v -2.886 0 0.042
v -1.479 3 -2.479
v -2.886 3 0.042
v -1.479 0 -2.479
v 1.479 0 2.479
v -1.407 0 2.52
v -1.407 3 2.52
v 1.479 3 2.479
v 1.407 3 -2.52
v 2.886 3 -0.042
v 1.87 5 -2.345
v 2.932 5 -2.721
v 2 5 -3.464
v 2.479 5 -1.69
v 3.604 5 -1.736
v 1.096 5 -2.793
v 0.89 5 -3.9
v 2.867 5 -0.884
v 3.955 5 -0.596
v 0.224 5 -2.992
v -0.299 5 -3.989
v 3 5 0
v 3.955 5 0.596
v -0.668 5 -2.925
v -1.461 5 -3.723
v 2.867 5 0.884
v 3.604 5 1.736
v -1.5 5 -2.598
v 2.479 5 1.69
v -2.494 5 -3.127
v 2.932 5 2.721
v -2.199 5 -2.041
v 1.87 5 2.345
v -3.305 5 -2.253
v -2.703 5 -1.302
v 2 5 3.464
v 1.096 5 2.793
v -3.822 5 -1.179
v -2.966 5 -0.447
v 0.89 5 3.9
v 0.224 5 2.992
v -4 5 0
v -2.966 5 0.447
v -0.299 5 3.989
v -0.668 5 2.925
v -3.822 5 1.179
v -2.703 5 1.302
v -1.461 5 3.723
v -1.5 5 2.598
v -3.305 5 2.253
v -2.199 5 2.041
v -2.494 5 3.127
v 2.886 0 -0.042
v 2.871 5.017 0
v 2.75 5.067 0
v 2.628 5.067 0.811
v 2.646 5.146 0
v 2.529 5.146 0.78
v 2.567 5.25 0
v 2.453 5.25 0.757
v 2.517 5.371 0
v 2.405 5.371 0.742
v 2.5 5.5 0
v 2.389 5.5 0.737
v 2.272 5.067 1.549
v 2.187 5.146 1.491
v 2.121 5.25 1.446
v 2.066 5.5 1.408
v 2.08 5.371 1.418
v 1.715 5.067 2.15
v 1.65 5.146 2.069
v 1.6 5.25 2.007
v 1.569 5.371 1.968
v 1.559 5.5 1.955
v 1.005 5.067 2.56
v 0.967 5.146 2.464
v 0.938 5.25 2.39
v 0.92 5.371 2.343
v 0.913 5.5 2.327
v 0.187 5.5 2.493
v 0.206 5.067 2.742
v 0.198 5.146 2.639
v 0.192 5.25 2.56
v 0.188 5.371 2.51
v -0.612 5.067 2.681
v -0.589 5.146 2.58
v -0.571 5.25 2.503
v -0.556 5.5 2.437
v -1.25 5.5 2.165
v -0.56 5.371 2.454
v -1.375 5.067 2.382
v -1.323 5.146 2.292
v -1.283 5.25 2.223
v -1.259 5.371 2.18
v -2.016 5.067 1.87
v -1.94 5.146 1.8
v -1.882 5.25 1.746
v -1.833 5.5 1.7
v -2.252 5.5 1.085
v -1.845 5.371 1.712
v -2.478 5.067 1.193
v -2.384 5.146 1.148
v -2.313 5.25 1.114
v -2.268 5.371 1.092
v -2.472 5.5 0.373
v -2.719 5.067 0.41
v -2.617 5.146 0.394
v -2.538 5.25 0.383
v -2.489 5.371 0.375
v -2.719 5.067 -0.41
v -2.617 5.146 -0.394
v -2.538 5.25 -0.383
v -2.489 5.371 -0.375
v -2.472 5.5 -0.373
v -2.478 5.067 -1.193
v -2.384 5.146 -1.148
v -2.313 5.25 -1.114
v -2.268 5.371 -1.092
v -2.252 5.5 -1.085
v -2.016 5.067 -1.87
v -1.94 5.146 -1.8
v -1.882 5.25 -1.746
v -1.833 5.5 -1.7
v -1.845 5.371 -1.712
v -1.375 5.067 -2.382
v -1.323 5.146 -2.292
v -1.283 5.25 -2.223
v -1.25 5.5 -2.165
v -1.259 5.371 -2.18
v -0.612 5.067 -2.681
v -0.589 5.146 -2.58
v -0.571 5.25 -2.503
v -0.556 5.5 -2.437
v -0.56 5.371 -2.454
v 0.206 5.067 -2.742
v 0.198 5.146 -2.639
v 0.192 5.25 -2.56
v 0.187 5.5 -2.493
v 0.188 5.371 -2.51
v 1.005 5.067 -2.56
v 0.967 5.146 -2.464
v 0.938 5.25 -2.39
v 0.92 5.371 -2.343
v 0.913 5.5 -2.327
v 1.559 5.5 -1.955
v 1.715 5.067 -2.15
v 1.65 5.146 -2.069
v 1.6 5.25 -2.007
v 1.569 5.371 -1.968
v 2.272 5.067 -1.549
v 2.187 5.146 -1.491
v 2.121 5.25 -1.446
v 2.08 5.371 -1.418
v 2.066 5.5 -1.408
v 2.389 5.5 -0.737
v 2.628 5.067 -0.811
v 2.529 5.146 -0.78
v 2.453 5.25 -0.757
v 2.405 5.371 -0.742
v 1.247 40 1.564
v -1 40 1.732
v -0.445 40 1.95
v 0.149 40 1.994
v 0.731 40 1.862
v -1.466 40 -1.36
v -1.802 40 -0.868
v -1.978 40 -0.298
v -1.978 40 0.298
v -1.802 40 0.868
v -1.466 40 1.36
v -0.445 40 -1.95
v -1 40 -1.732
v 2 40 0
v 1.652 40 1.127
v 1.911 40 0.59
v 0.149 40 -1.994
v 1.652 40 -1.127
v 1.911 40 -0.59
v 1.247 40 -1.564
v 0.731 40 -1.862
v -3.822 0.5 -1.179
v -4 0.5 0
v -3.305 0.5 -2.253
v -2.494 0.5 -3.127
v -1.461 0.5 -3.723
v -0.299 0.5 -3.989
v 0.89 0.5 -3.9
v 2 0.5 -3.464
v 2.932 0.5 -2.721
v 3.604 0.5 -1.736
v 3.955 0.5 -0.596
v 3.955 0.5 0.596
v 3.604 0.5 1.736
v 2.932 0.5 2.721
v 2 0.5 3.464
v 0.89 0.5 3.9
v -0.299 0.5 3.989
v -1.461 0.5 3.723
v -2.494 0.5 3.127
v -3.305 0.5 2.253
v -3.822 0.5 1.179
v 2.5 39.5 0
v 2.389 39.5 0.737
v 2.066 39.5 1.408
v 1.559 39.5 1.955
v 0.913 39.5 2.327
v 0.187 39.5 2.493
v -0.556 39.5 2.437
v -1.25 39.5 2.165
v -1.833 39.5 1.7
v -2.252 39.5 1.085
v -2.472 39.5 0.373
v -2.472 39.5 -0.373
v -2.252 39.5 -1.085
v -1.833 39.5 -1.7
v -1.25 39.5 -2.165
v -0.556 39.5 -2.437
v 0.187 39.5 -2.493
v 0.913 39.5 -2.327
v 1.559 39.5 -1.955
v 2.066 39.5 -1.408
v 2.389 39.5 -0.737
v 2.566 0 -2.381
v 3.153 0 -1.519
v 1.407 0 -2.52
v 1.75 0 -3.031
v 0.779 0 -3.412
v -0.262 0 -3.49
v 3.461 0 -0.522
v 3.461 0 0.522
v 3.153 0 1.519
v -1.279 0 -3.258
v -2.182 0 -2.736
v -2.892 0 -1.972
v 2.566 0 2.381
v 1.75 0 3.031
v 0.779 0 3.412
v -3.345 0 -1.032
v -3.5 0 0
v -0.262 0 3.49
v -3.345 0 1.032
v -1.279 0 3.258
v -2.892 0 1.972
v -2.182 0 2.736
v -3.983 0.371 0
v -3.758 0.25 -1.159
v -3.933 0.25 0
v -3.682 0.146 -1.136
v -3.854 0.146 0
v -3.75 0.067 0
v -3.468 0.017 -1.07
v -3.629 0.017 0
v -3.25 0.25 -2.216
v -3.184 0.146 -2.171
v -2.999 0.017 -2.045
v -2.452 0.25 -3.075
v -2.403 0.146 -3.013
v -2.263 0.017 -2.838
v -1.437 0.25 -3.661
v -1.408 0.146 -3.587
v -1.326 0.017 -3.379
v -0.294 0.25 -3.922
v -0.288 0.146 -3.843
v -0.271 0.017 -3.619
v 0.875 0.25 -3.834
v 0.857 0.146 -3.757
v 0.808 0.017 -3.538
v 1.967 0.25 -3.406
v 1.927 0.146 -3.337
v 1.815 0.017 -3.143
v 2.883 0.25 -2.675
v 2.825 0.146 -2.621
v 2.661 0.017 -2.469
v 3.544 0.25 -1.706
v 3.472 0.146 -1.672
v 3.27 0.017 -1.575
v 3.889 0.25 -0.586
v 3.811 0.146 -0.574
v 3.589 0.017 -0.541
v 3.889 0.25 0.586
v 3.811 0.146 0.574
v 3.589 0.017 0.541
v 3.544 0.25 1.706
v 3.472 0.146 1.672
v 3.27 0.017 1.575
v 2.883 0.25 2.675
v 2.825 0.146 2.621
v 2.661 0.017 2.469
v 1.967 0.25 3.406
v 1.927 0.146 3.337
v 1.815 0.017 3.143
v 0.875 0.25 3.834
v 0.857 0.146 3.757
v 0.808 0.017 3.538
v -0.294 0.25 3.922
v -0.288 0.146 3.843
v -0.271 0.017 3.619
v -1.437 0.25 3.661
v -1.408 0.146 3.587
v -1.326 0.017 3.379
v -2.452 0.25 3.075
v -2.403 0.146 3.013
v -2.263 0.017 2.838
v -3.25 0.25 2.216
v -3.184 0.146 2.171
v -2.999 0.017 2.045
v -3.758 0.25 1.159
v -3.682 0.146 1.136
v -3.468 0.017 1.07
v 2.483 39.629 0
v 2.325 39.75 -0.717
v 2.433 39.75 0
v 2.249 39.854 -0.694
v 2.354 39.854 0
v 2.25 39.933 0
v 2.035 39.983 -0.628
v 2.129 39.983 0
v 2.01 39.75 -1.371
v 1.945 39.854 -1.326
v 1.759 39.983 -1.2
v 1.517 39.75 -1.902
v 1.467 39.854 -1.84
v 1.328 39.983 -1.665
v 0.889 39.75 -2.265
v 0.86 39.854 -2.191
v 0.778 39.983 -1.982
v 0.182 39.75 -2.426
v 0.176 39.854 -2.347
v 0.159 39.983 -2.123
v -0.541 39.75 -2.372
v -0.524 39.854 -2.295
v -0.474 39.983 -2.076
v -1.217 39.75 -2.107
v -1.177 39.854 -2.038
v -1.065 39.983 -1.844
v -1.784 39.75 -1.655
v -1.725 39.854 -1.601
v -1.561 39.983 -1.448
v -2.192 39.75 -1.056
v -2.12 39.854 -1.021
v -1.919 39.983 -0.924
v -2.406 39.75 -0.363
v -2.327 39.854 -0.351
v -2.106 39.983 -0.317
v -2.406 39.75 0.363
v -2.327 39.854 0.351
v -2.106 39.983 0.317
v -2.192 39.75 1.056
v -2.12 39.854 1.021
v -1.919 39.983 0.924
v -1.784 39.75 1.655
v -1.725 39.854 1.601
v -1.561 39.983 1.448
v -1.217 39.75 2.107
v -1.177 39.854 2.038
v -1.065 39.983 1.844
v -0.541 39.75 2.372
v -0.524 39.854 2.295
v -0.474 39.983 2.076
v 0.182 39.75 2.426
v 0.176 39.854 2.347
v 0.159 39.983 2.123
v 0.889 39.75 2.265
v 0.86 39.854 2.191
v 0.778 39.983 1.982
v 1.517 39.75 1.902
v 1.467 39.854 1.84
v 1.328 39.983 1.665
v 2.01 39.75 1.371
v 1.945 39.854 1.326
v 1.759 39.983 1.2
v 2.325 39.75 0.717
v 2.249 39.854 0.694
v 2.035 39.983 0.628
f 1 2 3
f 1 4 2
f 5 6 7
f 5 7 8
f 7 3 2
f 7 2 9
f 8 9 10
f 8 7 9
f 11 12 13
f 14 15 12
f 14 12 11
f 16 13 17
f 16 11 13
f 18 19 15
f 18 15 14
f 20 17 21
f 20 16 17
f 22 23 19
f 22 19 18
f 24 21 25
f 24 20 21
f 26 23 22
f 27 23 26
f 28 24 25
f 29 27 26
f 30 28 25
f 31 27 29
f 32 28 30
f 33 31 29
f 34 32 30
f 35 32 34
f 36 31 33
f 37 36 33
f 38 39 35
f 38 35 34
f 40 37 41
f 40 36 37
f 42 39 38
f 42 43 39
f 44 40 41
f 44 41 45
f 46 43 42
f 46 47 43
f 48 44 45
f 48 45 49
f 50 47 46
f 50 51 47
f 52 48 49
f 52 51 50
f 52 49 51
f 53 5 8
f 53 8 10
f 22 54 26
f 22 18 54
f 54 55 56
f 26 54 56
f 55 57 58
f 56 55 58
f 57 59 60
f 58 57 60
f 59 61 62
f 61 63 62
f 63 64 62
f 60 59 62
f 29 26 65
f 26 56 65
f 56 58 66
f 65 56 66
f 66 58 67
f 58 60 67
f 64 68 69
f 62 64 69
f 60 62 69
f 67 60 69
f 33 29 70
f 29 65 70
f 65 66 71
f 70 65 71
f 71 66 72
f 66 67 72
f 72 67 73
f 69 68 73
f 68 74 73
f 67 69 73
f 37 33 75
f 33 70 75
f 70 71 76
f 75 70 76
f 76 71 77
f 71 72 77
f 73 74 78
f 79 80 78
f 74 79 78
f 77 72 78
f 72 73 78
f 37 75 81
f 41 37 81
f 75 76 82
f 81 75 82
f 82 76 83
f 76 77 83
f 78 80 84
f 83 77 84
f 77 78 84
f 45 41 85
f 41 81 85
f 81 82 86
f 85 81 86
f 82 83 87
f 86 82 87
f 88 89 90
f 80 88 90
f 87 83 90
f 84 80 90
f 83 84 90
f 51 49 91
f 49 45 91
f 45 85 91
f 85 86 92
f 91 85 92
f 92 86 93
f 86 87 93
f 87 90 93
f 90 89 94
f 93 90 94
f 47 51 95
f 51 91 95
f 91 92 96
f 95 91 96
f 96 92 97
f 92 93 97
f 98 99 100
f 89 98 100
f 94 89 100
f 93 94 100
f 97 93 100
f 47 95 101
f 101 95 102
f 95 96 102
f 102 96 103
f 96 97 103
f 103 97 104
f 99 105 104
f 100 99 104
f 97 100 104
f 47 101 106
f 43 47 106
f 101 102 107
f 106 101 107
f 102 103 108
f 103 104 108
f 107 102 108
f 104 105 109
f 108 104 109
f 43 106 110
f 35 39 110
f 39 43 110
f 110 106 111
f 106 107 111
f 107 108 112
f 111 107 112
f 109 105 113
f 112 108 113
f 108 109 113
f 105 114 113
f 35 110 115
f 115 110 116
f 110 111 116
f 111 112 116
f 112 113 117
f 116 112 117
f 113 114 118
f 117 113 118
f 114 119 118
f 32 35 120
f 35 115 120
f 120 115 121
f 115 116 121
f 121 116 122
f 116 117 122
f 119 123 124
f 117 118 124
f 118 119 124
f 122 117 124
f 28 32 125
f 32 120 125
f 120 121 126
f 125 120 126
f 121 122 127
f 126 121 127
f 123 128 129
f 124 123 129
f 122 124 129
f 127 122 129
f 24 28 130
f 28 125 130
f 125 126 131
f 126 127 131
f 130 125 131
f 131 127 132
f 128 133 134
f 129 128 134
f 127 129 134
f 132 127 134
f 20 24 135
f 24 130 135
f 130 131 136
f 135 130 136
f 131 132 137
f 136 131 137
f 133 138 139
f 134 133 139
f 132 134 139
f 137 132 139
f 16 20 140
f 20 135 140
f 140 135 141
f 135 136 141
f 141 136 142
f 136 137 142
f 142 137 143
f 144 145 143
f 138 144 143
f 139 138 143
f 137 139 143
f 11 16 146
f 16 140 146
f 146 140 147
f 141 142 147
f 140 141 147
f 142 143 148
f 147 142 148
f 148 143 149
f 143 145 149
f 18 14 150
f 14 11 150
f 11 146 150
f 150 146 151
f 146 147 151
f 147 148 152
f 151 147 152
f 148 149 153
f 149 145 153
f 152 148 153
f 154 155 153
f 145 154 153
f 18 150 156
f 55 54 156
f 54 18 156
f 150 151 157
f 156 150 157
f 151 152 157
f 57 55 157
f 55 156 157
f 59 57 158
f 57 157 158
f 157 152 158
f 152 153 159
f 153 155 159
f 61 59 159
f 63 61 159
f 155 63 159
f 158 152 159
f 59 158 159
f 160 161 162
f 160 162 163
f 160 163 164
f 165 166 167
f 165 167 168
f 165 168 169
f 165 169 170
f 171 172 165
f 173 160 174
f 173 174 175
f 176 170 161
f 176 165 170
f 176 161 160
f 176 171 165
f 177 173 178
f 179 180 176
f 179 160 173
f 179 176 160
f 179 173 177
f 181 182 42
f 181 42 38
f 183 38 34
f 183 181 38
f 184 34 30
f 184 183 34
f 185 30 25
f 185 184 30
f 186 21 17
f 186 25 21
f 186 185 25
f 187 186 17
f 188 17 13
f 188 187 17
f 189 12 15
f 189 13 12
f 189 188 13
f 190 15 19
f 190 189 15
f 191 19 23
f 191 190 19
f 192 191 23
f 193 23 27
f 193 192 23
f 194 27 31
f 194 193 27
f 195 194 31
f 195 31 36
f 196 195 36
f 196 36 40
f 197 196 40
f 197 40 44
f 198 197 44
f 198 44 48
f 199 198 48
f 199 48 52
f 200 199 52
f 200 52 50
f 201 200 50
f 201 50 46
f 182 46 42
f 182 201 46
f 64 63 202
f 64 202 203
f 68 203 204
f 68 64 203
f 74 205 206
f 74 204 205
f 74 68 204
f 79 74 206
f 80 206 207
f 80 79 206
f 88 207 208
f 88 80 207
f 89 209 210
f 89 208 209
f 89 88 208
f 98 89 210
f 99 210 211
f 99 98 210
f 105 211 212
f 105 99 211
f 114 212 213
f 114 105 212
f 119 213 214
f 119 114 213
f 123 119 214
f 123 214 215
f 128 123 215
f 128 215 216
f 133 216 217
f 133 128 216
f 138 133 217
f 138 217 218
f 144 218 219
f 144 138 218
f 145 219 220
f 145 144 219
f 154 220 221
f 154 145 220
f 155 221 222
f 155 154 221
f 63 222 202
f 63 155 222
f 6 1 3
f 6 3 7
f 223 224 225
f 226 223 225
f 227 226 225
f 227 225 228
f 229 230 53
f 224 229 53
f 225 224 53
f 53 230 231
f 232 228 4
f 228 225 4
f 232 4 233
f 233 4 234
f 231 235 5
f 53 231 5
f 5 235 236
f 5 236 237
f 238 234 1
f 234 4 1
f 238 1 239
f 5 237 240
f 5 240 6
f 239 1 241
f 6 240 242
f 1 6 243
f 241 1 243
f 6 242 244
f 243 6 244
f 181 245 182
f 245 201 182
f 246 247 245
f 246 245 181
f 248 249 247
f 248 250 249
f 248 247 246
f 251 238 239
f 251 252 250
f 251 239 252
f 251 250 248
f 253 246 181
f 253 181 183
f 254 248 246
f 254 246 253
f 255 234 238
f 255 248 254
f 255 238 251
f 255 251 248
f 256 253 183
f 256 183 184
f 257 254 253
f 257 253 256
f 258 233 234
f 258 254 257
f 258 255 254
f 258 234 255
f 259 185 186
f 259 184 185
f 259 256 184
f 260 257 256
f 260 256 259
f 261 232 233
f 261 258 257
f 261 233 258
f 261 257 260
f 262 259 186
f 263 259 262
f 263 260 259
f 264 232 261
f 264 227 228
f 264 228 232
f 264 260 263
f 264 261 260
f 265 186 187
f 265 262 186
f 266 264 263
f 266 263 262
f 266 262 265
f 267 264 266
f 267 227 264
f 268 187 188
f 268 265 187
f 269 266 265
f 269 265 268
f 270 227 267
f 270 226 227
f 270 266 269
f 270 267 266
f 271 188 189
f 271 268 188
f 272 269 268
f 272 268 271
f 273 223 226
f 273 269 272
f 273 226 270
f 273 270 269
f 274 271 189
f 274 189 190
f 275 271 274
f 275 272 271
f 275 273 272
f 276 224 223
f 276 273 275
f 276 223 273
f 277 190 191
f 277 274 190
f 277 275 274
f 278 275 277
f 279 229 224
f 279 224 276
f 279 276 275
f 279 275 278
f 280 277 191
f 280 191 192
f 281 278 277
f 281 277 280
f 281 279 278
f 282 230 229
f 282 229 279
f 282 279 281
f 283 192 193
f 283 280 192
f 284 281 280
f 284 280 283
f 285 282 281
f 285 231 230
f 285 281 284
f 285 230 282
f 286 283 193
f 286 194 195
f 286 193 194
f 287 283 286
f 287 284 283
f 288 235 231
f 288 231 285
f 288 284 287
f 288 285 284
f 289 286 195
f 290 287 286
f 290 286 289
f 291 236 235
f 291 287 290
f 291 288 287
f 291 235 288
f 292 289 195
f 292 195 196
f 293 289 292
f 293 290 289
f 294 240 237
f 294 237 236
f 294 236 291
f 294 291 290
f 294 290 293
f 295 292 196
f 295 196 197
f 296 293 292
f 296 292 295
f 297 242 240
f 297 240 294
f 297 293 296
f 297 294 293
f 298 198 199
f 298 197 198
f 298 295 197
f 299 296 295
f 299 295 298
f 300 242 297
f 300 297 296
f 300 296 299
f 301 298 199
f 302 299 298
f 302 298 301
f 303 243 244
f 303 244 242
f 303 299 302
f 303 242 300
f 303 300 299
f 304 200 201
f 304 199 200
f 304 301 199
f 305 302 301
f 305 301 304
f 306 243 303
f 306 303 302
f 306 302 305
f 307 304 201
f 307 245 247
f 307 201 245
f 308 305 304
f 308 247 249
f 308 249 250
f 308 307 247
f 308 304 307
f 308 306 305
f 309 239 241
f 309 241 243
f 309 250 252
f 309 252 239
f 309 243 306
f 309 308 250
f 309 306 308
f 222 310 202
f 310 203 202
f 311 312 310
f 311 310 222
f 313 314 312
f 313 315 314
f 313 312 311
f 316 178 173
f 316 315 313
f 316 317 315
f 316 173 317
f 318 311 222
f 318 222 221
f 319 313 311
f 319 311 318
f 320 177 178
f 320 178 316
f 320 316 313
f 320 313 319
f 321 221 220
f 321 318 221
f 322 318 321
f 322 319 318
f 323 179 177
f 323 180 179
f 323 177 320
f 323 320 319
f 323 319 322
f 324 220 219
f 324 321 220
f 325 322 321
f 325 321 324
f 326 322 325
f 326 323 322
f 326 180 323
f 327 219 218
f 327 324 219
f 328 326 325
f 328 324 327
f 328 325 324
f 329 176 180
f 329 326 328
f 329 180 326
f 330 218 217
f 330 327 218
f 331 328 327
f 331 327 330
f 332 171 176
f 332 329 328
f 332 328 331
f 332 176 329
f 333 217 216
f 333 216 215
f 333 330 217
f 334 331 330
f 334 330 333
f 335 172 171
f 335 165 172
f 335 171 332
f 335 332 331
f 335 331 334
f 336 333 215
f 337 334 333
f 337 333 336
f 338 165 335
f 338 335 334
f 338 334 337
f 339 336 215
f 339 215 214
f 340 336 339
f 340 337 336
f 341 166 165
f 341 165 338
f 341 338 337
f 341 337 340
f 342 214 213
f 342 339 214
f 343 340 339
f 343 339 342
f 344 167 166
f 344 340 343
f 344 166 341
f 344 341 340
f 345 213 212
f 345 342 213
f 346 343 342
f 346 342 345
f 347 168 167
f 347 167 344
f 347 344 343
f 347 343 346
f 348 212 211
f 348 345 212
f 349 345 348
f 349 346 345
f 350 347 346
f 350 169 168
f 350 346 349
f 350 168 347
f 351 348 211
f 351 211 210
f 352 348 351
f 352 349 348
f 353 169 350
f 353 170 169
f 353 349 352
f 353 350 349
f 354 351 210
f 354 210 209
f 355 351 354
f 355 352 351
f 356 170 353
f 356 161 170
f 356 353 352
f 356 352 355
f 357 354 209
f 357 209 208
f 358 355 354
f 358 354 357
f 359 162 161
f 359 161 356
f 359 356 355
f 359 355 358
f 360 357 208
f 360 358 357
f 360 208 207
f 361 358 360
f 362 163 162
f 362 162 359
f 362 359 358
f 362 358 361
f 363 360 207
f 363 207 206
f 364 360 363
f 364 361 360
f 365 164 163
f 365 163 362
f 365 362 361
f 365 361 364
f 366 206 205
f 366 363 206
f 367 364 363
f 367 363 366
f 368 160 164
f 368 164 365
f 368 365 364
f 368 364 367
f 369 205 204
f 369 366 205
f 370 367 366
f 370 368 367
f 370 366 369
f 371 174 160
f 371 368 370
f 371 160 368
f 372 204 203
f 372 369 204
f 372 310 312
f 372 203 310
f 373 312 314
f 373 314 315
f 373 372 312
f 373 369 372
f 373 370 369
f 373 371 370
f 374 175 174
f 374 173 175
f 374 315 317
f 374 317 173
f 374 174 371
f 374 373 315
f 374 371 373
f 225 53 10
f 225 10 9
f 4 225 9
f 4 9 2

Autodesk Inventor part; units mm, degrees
ref_plane "YZ Plane" through (0, 0, 0) normal (1, 0, 0) x (0, 1, 0)
ref_plane "XZ Plane" through (0, 0, 0) normal (0, 1, 0) x (-1, 0, 0)
ref_plane "XY Plane" through (0, 0, 0) normal (0, 0, 1) x (1, 0, 0)
sketch "Sketch1" plane through (0, 0, 0) normal (0, 1, 0) x (-1, 0, 0)
  circle A0 centre (0, 0) radius 4
  dimension "d0" = 8
extrude "Extrusion1" add sketch "Sketch1" along normal blind 5
sketch "Sketch2" plane through (0, 5, 0) normal (0, 1, 0) x (1, 0, 0)
  circle A0 centre (0, 0) radius 2.5
  dimension "d3" = 5
extrude "Extrusion2" add sketch "Sketch2" along normal blind 35
sketch "Sketch3" plane through (0, 0, 0) normal (0, -1, 0) x (1, 0, 0)
  line L0 (2.8865, -0.0416) -> (1.4072, -2.5205)
  line L1 (1.4072, -2.5205) -> (-1.4792, -2.479)
  line L2 (-1.4792, -2.479) -> (-2.8865, 0.0416)
  line L3 (-2.8865, 0.0416) -> (-1.4072, 2.5205)
  line L4 (-1.4072, 2.5205) -> (1.4792, 2.479)
  line L5 (1.4792, 2.479) -> (2.8865, -0.0416)
  point P0 (0, 0)
  point P1 (0, 0)
  dimension "d6" = 2.5
extrude "Extrusion3" cut sketch "Sketch3" against normal blind 3
fillet "Fillet1" radius 0.5 1 edges at (4, 0, 0)
fillet "Fillet2" radius 0.5 2 edges at (-2.5, 5, 0) (-2.5, 40, 0)
properties part number "bulong5mm"
